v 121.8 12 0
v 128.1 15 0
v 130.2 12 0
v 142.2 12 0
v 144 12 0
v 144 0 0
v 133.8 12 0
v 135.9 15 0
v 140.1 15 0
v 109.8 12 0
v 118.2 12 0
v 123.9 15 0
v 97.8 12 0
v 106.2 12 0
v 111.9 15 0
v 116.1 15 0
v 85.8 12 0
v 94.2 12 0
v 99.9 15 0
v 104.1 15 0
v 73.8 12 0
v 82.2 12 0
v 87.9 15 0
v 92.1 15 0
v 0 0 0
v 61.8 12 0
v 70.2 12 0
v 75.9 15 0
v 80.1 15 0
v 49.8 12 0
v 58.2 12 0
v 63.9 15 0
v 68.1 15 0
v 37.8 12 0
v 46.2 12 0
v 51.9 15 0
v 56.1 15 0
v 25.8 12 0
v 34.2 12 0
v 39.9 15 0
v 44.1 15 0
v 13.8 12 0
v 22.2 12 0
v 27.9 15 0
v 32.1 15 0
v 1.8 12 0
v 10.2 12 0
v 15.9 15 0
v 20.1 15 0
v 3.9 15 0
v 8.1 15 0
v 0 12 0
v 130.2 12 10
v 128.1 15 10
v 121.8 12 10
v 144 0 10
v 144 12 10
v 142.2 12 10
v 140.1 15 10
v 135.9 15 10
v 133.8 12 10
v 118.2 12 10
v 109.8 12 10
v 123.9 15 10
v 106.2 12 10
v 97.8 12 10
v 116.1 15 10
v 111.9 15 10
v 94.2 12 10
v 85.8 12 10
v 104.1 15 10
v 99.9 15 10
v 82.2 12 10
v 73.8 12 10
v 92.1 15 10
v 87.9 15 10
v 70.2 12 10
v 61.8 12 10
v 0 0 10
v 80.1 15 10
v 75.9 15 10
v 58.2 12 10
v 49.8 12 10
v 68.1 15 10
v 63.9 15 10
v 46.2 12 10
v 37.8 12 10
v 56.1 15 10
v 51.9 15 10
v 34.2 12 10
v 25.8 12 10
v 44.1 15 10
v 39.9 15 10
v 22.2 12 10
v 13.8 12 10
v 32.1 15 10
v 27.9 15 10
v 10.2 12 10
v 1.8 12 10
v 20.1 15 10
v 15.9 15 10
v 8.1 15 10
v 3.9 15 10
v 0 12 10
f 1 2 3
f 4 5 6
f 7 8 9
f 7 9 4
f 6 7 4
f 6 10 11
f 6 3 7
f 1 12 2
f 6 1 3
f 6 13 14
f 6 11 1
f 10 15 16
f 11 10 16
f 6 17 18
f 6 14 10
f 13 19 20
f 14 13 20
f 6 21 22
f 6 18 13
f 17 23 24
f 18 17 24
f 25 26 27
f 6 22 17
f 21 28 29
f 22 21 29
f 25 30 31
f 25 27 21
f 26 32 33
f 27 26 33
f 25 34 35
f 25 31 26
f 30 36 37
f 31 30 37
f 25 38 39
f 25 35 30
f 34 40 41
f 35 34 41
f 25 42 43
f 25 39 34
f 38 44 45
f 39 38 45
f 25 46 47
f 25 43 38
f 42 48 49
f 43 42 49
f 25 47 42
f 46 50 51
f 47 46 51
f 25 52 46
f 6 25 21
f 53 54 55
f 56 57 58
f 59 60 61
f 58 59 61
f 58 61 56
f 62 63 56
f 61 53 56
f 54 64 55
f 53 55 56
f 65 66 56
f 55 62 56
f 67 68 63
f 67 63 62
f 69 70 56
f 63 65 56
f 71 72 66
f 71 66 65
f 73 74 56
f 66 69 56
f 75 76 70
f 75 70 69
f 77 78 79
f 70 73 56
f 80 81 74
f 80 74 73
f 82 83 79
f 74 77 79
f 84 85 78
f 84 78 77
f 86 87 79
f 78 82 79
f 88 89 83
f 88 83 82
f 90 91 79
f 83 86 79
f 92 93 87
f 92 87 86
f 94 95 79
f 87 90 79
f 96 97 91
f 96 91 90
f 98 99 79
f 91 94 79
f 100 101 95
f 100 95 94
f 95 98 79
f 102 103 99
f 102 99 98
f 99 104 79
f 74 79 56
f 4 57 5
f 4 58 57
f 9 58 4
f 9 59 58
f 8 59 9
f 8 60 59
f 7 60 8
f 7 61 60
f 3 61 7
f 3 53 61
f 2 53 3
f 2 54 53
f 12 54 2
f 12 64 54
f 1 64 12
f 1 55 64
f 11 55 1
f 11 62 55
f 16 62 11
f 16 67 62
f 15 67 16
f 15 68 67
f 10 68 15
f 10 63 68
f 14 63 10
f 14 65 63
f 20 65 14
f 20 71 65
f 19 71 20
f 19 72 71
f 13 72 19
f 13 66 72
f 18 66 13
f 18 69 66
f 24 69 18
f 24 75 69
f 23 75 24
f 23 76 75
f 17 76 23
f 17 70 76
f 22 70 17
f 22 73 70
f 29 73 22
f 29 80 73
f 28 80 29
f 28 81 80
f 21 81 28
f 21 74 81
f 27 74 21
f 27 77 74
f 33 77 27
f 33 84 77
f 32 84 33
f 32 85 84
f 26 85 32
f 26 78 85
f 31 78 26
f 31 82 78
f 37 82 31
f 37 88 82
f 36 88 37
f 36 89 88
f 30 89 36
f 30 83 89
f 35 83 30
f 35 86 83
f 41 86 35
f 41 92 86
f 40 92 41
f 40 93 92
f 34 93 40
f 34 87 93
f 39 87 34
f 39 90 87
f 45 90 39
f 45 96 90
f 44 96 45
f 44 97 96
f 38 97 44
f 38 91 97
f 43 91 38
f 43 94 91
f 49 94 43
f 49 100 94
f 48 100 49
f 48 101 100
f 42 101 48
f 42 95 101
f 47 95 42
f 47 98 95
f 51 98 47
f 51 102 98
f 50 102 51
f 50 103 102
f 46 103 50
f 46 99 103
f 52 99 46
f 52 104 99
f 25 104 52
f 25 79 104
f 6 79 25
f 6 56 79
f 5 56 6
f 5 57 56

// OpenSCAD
$fn = 32;

// ----------------------------------------------------------------------
// Gear rack: 12 teeth, pitch 12 mm
// ----------------------------------------------------------------------

// --- parameters (mm) ---
teeth = 12;               // number of teeth
pitch = 12;               // tooth pitch, X
root_w = 8.4;             // tooth width at the root
tip_w = 4.2;              // tooth width at the tip
base_h = 12;              // rack body height, Y
tooth_h = 3;              // tooth height above the body
plate_t = 10;             // rack width, Z (extrusion height)

rack_l = teeth * pitch;  // overall length
total_h = base_h + tooth_h;  // overall height

profile = [[0, 0], [144, 0], [144, 12], [142.2, 12], [140.1, 15], [135.9, 15], [133.8, 12], [130.2, 12], [128.1, 15], [123.9, 15], [121.8, 12], [118.2, 12], [116.1, 15], [111.9, 15], [109.8, 12], [106.2, 12], [104.1, 15], [99.9, 15], [97.8, 12], [94.2, 12], [92.1, 15], [87.9, 15], [85.8, 12], [82.2, 12], [80.1, 15], [75.9, 15], [73.8, 12], [70.2, 12], [68.1, 15], [63.9, 15], [61.8, 12], [58.2, 12], [56.1, 15], [51.9, 15], [49.8, 12], [46.2, 12], [44.1, 15], [39.9, 15], [37.8, 12], [34.2, 12], [32.1, 15], [27.9, 15], [25.8, 12], [22.2, 12], [20.1, 15], [15.9, 15], [13.8, 12], [10.2, 12], [8.1, 15], [3.9, 15], [1.8, 12], [0, 12]];  // primary outline, 52 points, counter clockwise

// --- the one profile operation ---
linear_extrude(height = plate_t) polygon(points = profile);
